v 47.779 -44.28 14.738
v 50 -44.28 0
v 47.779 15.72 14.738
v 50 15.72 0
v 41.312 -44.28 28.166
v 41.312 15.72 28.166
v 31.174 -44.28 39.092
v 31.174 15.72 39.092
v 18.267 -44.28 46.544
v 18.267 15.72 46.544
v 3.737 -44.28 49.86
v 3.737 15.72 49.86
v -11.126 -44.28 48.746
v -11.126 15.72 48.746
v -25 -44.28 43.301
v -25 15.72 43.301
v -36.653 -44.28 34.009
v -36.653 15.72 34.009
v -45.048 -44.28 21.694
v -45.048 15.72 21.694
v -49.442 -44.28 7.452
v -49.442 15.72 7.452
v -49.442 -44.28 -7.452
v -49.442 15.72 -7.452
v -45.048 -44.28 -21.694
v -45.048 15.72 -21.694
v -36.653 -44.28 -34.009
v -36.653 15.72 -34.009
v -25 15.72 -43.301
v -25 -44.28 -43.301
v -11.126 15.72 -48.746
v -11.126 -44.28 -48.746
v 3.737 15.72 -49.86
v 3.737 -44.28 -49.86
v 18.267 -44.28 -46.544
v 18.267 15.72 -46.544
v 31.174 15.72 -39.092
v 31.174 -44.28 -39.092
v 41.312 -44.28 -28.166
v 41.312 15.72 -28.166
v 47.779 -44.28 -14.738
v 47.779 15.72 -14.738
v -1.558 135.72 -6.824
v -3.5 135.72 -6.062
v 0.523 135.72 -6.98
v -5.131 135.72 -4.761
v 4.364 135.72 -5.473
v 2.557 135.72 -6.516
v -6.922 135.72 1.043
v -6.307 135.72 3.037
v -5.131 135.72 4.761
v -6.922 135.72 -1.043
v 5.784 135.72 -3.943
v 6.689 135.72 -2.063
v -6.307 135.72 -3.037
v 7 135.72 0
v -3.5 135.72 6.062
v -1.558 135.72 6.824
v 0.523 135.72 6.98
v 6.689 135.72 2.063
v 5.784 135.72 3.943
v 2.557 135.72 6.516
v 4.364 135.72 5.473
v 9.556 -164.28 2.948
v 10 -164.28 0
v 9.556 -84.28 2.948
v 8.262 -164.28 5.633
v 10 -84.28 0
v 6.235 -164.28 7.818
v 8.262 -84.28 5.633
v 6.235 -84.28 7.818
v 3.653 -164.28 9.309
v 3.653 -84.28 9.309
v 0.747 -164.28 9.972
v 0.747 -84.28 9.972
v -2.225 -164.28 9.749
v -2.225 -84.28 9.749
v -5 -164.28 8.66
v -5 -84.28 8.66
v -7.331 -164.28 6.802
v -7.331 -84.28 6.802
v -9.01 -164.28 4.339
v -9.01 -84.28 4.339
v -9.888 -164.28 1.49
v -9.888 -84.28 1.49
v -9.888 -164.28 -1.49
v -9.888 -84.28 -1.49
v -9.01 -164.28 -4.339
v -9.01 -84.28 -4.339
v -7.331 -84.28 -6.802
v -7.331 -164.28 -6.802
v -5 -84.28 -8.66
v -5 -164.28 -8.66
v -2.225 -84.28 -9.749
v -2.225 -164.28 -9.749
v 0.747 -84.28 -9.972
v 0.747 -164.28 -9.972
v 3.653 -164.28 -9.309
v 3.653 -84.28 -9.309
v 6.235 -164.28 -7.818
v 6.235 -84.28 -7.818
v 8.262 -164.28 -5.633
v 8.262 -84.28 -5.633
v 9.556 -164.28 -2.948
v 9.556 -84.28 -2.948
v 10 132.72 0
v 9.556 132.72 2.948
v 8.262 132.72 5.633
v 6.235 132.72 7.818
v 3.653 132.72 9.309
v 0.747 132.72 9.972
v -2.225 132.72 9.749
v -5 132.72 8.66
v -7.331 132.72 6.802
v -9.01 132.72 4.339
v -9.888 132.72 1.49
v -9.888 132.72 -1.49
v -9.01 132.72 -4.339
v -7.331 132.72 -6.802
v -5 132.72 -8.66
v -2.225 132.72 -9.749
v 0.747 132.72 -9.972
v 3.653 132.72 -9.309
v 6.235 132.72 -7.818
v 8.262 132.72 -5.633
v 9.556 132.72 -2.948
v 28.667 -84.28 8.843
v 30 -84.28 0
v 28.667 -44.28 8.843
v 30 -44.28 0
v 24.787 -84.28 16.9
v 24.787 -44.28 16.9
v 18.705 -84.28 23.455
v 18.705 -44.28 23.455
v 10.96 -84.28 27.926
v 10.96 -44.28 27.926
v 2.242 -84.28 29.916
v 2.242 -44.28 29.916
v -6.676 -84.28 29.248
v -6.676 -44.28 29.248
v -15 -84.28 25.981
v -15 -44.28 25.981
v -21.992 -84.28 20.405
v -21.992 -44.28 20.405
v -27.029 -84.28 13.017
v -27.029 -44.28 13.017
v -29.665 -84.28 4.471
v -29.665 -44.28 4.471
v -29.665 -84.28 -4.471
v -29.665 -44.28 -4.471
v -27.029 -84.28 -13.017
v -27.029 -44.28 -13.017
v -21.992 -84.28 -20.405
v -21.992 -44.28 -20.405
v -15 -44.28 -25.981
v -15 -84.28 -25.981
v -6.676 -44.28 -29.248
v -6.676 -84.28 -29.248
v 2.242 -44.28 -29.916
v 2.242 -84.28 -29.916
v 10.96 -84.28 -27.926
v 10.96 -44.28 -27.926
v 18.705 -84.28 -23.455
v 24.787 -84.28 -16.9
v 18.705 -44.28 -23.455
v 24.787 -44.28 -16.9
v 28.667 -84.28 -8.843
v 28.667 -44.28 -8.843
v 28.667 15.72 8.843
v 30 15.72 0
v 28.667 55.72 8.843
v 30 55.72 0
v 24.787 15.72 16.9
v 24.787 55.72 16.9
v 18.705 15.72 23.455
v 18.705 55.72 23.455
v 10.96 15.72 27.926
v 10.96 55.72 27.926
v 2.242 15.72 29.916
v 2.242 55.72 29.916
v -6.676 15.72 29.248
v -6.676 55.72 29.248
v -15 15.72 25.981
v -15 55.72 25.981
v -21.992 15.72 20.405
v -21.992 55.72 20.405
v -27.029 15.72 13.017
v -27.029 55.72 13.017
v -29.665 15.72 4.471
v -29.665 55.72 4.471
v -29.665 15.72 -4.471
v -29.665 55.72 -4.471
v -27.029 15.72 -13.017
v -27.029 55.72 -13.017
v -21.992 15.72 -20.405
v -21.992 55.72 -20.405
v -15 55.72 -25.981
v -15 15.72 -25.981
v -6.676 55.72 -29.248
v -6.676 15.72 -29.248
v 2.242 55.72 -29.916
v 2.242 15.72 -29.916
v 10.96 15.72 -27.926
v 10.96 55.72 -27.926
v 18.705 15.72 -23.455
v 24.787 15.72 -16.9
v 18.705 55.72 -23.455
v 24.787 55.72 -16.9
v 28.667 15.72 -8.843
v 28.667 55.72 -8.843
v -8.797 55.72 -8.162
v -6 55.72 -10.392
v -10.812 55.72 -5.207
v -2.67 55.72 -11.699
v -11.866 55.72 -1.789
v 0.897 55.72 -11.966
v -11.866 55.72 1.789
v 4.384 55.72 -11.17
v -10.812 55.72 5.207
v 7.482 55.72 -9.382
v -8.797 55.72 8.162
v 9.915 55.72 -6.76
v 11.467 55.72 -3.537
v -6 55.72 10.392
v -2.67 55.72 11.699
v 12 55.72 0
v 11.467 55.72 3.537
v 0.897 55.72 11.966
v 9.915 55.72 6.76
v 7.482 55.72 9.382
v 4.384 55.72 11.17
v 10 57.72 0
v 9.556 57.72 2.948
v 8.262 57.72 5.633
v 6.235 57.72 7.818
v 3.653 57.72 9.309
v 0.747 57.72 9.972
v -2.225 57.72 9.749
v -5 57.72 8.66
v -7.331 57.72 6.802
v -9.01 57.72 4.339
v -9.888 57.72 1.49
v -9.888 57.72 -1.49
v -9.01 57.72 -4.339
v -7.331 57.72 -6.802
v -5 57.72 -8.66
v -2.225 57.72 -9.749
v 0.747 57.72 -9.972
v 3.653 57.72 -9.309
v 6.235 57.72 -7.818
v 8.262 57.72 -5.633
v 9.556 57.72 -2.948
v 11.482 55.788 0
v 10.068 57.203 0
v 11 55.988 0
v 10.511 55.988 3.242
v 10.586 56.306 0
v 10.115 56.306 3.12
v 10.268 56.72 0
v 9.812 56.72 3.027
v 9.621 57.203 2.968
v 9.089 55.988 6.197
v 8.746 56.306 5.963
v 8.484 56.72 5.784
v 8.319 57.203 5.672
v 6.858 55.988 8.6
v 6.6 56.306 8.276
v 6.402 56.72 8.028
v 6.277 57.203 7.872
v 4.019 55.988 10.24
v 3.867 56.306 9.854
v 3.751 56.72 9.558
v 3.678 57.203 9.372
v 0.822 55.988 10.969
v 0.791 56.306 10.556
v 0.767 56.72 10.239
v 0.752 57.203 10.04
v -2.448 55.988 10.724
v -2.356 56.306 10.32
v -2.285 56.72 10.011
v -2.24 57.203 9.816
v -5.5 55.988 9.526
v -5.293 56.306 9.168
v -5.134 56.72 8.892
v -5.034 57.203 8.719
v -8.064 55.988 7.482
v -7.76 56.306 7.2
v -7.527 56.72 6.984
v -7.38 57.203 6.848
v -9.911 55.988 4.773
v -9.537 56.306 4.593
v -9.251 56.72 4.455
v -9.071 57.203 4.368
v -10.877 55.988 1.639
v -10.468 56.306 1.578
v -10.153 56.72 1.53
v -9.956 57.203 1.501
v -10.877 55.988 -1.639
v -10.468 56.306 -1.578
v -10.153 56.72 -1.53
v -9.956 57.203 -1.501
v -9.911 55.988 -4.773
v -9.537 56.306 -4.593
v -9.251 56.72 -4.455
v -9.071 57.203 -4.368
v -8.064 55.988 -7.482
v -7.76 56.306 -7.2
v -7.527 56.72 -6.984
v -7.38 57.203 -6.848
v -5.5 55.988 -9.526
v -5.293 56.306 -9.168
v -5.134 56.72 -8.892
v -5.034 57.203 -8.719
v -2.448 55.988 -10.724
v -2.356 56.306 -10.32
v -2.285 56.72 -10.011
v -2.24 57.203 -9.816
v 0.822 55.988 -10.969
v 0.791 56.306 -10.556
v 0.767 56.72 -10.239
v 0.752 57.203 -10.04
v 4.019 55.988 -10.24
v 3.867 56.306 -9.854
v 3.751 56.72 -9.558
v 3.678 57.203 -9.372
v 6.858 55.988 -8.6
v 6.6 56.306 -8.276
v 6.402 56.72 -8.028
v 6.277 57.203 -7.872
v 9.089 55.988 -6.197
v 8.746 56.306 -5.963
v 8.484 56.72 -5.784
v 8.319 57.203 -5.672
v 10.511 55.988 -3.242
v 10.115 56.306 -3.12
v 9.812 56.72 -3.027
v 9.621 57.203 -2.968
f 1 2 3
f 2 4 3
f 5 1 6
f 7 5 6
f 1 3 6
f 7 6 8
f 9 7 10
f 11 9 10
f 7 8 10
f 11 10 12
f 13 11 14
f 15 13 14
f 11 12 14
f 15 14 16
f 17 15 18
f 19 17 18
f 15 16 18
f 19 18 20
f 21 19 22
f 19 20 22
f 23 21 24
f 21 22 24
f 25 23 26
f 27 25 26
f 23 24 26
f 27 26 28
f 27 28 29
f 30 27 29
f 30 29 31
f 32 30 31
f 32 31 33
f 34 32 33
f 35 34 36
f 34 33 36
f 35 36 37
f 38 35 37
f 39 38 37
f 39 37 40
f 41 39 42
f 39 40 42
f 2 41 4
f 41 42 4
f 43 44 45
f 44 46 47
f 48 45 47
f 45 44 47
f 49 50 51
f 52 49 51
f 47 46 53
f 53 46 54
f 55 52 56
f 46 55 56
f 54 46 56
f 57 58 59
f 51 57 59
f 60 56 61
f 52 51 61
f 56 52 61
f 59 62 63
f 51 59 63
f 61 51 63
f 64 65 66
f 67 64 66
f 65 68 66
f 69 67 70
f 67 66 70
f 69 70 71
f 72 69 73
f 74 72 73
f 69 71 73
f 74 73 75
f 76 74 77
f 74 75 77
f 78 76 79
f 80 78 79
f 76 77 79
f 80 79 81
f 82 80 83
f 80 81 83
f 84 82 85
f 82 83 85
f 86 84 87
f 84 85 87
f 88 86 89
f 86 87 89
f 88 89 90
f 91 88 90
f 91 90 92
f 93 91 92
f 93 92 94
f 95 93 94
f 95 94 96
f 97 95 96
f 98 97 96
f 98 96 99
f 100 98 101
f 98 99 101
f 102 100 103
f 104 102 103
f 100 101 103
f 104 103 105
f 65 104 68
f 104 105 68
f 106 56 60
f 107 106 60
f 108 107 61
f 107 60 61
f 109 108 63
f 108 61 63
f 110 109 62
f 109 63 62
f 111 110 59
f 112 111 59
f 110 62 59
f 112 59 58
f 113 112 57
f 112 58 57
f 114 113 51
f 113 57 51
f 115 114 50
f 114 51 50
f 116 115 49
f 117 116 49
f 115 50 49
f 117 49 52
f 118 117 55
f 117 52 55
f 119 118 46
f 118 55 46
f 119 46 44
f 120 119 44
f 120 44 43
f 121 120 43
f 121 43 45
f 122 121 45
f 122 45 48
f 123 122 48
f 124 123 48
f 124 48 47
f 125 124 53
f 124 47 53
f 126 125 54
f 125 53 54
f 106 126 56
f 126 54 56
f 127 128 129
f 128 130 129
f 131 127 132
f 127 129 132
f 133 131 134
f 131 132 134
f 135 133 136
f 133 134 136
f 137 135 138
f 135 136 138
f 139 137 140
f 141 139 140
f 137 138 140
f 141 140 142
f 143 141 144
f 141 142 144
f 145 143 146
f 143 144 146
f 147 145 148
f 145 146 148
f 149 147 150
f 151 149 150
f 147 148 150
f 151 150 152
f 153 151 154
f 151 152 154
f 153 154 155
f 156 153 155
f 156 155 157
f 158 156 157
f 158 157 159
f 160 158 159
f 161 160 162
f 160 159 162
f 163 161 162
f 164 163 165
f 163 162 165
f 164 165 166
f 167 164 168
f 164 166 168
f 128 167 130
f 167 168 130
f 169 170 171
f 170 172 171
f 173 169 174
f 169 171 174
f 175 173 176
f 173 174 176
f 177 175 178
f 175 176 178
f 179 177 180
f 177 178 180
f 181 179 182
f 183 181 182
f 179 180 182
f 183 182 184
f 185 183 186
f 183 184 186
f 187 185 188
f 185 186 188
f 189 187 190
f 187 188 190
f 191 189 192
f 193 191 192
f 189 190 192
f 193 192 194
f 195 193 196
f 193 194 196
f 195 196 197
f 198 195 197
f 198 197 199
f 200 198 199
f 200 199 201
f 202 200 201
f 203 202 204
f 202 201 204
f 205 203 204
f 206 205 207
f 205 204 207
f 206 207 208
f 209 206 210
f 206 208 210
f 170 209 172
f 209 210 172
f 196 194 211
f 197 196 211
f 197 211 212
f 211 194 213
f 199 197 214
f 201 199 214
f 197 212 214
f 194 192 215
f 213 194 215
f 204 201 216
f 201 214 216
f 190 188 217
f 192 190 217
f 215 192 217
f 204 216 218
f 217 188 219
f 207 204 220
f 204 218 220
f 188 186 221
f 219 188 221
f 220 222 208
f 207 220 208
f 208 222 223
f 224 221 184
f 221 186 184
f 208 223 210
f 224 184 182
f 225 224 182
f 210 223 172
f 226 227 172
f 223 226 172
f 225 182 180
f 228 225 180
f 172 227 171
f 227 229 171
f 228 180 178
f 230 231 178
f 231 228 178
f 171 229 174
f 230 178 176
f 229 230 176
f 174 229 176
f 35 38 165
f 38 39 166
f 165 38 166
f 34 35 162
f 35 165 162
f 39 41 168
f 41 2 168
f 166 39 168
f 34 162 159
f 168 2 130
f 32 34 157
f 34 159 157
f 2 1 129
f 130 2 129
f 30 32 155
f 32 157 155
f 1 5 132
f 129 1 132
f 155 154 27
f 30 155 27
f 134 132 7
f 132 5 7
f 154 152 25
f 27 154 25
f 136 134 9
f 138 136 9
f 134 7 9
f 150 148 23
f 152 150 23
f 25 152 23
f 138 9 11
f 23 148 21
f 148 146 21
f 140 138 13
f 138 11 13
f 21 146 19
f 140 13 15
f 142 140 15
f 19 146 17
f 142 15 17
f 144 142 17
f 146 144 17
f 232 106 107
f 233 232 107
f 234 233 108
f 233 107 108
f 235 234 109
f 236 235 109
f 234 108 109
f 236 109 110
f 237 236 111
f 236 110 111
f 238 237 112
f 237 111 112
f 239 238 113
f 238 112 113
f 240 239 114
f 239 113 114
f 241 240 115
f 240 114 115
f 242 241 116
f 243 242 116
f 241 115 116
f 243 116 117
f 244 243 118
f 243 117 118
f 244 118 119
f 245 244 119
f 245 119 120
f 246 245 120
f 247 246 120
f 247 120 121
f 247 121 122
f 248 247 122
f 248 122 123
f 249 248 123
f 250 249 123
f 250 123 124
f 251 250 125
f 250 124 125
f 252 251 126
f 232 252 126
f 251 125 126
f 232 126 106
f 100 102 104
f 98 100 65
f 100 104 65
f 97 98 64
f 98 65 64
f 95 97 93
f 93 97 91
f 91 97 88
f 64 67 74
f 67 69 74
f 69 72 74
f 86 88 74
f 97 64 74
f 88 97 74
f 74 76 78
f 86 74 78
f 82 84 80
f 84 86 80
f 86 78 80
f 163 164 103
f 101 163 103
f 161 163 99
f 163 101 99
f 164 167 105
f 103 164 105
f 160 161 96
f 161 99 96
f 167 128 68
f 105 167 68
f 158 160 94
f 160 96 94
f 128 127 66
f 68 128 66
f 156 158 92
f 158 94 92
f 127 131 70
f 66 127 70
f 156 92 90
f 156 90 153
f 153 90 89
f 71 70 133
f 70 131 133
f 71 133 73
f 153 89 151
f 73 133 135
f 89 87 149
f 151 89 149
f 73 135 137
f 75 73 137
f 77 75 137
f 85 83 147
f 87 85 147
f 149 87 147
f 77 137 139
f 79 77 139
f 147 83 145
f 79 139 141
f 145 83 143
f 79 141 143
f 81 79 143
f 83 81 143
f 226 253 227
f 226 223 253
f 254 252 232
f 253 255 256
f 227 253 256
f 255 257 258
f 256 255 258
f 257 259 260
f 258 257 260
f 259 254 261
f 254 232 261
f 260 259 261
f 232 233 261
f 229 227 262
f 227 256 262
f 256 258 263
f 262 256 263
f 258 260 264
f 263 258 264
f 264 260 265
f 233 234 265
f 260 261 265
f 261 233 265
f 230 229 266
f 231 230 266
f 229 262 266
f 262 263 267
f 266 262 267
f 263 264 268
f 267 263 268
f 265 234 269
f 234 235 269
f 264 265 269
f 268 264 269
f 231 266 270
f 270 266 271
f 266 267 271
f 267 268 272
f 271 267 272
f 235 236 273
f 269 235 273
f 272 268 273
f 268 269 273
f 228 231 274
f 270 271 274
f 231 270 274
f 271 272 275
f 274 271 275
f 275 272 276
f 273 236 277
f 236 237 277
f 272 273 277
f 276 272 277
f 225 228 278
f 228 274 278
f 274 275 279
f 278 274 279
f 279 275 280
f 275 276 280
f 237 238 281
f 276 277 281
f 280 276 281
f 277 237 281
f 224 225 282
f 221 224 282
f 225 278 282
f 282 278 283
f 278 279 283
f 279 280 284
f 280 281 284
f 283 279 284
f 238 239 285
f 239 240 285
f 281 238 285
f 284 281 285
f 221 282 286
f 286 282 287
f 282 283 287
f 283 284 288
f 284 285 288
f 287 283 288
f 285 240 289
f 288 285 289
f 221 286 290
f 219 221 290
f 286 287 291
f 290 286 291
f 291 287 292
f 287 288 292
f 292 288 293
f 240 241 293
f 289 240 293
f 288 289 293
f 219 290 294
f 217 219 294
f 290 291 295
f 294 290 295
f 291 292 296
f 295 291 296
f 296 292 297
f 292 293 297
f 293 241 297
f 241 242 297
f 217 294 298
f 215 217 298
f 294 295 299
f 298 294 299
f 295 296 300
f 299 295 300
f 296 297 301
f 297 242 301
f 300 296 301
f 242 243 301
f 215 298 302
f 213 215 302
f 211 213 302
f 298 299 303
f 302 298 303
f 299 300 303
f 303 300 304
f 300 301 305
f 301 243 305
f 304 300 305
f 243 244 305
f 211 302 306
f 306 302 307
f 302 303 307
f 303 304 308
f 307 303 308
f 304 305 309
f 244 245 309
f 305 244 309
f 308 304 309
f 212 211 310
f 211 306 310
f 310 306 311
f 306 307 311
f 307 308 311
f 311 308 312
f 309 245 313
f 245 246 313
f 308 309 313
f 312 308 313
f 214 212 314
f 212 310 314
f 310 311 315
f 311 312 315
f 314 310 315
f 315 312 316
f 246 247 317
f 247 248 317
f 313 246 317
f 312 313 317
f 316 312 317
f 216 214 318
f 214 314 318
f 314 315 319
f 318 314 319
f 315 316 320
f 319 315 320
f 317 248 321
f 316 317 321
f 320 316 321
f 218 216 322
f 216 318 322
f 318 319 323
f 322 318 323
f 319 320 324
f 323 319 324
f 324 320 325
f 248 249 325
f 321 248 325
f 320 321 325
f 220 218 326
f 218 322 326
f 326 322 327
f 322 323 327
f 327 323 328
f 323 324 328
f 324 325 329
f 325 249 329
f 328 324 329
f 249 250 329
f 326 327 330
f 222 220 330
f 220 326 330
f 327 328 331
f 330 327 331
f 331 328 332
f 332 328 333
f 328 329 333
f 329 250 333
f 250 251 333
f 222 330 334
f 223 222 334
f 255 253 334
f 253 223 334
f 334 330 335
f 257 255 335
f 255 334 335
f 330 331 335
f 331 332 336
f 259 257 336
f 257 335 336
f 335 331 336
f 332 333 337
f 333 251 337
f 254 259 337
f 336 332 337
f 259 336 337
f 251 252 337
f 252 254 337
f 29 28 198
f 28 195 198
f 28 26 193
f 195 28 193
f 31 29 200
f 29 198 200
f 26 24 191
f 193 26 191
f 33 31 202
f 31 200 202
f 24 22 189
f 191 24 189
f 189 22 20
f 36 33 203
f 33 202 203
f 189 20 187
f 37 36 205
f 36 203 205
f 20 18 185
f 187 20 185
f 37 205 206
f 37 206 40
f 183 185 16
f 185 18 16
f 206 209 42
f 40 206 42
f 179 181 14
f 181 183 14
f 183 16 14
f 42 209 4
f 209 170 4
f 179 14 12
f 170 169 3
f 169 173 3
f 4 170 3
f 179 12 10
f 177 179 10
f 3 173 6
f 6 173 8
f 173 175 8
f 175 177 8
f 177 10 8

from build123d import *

# Parameters (mm, degrees)
F2_R    = 2
F3_SIZE = 3


with BuildPart() as f1:
    # F0 (on Top) → F1 (revolve)
    with BuildSketch(Plane.XY):
        Polygon((30, 55.720315), (10, 55.720315), (10, 135.720315), (0, 135.720315), (0, -164.279685), (10, -164.279685), (10, -84.279685), (30, -84.279685), (30, -44.279685), (50, -44.279685), (50, 15.720315), (30, 15.720315), align=None)
    revolve(axis=Axis((0, -14.279685, 0), (0, -1, 0)))

    # F2
    f2_edges = [f1.edges().sort_by_distance(p)[0] for p in [
        (-10, 55.720315, 0),
    ]]
    fillet(f2_edges, radius=F2_R)

    # F3
    f3_edges = [f1.edges().sort_by_distance(p)[0] for p in [
        (-10, 135.720315, 0),
    ]]
    chamfer(f3_edges, length=F3_SIZE)


solid = f1.part
